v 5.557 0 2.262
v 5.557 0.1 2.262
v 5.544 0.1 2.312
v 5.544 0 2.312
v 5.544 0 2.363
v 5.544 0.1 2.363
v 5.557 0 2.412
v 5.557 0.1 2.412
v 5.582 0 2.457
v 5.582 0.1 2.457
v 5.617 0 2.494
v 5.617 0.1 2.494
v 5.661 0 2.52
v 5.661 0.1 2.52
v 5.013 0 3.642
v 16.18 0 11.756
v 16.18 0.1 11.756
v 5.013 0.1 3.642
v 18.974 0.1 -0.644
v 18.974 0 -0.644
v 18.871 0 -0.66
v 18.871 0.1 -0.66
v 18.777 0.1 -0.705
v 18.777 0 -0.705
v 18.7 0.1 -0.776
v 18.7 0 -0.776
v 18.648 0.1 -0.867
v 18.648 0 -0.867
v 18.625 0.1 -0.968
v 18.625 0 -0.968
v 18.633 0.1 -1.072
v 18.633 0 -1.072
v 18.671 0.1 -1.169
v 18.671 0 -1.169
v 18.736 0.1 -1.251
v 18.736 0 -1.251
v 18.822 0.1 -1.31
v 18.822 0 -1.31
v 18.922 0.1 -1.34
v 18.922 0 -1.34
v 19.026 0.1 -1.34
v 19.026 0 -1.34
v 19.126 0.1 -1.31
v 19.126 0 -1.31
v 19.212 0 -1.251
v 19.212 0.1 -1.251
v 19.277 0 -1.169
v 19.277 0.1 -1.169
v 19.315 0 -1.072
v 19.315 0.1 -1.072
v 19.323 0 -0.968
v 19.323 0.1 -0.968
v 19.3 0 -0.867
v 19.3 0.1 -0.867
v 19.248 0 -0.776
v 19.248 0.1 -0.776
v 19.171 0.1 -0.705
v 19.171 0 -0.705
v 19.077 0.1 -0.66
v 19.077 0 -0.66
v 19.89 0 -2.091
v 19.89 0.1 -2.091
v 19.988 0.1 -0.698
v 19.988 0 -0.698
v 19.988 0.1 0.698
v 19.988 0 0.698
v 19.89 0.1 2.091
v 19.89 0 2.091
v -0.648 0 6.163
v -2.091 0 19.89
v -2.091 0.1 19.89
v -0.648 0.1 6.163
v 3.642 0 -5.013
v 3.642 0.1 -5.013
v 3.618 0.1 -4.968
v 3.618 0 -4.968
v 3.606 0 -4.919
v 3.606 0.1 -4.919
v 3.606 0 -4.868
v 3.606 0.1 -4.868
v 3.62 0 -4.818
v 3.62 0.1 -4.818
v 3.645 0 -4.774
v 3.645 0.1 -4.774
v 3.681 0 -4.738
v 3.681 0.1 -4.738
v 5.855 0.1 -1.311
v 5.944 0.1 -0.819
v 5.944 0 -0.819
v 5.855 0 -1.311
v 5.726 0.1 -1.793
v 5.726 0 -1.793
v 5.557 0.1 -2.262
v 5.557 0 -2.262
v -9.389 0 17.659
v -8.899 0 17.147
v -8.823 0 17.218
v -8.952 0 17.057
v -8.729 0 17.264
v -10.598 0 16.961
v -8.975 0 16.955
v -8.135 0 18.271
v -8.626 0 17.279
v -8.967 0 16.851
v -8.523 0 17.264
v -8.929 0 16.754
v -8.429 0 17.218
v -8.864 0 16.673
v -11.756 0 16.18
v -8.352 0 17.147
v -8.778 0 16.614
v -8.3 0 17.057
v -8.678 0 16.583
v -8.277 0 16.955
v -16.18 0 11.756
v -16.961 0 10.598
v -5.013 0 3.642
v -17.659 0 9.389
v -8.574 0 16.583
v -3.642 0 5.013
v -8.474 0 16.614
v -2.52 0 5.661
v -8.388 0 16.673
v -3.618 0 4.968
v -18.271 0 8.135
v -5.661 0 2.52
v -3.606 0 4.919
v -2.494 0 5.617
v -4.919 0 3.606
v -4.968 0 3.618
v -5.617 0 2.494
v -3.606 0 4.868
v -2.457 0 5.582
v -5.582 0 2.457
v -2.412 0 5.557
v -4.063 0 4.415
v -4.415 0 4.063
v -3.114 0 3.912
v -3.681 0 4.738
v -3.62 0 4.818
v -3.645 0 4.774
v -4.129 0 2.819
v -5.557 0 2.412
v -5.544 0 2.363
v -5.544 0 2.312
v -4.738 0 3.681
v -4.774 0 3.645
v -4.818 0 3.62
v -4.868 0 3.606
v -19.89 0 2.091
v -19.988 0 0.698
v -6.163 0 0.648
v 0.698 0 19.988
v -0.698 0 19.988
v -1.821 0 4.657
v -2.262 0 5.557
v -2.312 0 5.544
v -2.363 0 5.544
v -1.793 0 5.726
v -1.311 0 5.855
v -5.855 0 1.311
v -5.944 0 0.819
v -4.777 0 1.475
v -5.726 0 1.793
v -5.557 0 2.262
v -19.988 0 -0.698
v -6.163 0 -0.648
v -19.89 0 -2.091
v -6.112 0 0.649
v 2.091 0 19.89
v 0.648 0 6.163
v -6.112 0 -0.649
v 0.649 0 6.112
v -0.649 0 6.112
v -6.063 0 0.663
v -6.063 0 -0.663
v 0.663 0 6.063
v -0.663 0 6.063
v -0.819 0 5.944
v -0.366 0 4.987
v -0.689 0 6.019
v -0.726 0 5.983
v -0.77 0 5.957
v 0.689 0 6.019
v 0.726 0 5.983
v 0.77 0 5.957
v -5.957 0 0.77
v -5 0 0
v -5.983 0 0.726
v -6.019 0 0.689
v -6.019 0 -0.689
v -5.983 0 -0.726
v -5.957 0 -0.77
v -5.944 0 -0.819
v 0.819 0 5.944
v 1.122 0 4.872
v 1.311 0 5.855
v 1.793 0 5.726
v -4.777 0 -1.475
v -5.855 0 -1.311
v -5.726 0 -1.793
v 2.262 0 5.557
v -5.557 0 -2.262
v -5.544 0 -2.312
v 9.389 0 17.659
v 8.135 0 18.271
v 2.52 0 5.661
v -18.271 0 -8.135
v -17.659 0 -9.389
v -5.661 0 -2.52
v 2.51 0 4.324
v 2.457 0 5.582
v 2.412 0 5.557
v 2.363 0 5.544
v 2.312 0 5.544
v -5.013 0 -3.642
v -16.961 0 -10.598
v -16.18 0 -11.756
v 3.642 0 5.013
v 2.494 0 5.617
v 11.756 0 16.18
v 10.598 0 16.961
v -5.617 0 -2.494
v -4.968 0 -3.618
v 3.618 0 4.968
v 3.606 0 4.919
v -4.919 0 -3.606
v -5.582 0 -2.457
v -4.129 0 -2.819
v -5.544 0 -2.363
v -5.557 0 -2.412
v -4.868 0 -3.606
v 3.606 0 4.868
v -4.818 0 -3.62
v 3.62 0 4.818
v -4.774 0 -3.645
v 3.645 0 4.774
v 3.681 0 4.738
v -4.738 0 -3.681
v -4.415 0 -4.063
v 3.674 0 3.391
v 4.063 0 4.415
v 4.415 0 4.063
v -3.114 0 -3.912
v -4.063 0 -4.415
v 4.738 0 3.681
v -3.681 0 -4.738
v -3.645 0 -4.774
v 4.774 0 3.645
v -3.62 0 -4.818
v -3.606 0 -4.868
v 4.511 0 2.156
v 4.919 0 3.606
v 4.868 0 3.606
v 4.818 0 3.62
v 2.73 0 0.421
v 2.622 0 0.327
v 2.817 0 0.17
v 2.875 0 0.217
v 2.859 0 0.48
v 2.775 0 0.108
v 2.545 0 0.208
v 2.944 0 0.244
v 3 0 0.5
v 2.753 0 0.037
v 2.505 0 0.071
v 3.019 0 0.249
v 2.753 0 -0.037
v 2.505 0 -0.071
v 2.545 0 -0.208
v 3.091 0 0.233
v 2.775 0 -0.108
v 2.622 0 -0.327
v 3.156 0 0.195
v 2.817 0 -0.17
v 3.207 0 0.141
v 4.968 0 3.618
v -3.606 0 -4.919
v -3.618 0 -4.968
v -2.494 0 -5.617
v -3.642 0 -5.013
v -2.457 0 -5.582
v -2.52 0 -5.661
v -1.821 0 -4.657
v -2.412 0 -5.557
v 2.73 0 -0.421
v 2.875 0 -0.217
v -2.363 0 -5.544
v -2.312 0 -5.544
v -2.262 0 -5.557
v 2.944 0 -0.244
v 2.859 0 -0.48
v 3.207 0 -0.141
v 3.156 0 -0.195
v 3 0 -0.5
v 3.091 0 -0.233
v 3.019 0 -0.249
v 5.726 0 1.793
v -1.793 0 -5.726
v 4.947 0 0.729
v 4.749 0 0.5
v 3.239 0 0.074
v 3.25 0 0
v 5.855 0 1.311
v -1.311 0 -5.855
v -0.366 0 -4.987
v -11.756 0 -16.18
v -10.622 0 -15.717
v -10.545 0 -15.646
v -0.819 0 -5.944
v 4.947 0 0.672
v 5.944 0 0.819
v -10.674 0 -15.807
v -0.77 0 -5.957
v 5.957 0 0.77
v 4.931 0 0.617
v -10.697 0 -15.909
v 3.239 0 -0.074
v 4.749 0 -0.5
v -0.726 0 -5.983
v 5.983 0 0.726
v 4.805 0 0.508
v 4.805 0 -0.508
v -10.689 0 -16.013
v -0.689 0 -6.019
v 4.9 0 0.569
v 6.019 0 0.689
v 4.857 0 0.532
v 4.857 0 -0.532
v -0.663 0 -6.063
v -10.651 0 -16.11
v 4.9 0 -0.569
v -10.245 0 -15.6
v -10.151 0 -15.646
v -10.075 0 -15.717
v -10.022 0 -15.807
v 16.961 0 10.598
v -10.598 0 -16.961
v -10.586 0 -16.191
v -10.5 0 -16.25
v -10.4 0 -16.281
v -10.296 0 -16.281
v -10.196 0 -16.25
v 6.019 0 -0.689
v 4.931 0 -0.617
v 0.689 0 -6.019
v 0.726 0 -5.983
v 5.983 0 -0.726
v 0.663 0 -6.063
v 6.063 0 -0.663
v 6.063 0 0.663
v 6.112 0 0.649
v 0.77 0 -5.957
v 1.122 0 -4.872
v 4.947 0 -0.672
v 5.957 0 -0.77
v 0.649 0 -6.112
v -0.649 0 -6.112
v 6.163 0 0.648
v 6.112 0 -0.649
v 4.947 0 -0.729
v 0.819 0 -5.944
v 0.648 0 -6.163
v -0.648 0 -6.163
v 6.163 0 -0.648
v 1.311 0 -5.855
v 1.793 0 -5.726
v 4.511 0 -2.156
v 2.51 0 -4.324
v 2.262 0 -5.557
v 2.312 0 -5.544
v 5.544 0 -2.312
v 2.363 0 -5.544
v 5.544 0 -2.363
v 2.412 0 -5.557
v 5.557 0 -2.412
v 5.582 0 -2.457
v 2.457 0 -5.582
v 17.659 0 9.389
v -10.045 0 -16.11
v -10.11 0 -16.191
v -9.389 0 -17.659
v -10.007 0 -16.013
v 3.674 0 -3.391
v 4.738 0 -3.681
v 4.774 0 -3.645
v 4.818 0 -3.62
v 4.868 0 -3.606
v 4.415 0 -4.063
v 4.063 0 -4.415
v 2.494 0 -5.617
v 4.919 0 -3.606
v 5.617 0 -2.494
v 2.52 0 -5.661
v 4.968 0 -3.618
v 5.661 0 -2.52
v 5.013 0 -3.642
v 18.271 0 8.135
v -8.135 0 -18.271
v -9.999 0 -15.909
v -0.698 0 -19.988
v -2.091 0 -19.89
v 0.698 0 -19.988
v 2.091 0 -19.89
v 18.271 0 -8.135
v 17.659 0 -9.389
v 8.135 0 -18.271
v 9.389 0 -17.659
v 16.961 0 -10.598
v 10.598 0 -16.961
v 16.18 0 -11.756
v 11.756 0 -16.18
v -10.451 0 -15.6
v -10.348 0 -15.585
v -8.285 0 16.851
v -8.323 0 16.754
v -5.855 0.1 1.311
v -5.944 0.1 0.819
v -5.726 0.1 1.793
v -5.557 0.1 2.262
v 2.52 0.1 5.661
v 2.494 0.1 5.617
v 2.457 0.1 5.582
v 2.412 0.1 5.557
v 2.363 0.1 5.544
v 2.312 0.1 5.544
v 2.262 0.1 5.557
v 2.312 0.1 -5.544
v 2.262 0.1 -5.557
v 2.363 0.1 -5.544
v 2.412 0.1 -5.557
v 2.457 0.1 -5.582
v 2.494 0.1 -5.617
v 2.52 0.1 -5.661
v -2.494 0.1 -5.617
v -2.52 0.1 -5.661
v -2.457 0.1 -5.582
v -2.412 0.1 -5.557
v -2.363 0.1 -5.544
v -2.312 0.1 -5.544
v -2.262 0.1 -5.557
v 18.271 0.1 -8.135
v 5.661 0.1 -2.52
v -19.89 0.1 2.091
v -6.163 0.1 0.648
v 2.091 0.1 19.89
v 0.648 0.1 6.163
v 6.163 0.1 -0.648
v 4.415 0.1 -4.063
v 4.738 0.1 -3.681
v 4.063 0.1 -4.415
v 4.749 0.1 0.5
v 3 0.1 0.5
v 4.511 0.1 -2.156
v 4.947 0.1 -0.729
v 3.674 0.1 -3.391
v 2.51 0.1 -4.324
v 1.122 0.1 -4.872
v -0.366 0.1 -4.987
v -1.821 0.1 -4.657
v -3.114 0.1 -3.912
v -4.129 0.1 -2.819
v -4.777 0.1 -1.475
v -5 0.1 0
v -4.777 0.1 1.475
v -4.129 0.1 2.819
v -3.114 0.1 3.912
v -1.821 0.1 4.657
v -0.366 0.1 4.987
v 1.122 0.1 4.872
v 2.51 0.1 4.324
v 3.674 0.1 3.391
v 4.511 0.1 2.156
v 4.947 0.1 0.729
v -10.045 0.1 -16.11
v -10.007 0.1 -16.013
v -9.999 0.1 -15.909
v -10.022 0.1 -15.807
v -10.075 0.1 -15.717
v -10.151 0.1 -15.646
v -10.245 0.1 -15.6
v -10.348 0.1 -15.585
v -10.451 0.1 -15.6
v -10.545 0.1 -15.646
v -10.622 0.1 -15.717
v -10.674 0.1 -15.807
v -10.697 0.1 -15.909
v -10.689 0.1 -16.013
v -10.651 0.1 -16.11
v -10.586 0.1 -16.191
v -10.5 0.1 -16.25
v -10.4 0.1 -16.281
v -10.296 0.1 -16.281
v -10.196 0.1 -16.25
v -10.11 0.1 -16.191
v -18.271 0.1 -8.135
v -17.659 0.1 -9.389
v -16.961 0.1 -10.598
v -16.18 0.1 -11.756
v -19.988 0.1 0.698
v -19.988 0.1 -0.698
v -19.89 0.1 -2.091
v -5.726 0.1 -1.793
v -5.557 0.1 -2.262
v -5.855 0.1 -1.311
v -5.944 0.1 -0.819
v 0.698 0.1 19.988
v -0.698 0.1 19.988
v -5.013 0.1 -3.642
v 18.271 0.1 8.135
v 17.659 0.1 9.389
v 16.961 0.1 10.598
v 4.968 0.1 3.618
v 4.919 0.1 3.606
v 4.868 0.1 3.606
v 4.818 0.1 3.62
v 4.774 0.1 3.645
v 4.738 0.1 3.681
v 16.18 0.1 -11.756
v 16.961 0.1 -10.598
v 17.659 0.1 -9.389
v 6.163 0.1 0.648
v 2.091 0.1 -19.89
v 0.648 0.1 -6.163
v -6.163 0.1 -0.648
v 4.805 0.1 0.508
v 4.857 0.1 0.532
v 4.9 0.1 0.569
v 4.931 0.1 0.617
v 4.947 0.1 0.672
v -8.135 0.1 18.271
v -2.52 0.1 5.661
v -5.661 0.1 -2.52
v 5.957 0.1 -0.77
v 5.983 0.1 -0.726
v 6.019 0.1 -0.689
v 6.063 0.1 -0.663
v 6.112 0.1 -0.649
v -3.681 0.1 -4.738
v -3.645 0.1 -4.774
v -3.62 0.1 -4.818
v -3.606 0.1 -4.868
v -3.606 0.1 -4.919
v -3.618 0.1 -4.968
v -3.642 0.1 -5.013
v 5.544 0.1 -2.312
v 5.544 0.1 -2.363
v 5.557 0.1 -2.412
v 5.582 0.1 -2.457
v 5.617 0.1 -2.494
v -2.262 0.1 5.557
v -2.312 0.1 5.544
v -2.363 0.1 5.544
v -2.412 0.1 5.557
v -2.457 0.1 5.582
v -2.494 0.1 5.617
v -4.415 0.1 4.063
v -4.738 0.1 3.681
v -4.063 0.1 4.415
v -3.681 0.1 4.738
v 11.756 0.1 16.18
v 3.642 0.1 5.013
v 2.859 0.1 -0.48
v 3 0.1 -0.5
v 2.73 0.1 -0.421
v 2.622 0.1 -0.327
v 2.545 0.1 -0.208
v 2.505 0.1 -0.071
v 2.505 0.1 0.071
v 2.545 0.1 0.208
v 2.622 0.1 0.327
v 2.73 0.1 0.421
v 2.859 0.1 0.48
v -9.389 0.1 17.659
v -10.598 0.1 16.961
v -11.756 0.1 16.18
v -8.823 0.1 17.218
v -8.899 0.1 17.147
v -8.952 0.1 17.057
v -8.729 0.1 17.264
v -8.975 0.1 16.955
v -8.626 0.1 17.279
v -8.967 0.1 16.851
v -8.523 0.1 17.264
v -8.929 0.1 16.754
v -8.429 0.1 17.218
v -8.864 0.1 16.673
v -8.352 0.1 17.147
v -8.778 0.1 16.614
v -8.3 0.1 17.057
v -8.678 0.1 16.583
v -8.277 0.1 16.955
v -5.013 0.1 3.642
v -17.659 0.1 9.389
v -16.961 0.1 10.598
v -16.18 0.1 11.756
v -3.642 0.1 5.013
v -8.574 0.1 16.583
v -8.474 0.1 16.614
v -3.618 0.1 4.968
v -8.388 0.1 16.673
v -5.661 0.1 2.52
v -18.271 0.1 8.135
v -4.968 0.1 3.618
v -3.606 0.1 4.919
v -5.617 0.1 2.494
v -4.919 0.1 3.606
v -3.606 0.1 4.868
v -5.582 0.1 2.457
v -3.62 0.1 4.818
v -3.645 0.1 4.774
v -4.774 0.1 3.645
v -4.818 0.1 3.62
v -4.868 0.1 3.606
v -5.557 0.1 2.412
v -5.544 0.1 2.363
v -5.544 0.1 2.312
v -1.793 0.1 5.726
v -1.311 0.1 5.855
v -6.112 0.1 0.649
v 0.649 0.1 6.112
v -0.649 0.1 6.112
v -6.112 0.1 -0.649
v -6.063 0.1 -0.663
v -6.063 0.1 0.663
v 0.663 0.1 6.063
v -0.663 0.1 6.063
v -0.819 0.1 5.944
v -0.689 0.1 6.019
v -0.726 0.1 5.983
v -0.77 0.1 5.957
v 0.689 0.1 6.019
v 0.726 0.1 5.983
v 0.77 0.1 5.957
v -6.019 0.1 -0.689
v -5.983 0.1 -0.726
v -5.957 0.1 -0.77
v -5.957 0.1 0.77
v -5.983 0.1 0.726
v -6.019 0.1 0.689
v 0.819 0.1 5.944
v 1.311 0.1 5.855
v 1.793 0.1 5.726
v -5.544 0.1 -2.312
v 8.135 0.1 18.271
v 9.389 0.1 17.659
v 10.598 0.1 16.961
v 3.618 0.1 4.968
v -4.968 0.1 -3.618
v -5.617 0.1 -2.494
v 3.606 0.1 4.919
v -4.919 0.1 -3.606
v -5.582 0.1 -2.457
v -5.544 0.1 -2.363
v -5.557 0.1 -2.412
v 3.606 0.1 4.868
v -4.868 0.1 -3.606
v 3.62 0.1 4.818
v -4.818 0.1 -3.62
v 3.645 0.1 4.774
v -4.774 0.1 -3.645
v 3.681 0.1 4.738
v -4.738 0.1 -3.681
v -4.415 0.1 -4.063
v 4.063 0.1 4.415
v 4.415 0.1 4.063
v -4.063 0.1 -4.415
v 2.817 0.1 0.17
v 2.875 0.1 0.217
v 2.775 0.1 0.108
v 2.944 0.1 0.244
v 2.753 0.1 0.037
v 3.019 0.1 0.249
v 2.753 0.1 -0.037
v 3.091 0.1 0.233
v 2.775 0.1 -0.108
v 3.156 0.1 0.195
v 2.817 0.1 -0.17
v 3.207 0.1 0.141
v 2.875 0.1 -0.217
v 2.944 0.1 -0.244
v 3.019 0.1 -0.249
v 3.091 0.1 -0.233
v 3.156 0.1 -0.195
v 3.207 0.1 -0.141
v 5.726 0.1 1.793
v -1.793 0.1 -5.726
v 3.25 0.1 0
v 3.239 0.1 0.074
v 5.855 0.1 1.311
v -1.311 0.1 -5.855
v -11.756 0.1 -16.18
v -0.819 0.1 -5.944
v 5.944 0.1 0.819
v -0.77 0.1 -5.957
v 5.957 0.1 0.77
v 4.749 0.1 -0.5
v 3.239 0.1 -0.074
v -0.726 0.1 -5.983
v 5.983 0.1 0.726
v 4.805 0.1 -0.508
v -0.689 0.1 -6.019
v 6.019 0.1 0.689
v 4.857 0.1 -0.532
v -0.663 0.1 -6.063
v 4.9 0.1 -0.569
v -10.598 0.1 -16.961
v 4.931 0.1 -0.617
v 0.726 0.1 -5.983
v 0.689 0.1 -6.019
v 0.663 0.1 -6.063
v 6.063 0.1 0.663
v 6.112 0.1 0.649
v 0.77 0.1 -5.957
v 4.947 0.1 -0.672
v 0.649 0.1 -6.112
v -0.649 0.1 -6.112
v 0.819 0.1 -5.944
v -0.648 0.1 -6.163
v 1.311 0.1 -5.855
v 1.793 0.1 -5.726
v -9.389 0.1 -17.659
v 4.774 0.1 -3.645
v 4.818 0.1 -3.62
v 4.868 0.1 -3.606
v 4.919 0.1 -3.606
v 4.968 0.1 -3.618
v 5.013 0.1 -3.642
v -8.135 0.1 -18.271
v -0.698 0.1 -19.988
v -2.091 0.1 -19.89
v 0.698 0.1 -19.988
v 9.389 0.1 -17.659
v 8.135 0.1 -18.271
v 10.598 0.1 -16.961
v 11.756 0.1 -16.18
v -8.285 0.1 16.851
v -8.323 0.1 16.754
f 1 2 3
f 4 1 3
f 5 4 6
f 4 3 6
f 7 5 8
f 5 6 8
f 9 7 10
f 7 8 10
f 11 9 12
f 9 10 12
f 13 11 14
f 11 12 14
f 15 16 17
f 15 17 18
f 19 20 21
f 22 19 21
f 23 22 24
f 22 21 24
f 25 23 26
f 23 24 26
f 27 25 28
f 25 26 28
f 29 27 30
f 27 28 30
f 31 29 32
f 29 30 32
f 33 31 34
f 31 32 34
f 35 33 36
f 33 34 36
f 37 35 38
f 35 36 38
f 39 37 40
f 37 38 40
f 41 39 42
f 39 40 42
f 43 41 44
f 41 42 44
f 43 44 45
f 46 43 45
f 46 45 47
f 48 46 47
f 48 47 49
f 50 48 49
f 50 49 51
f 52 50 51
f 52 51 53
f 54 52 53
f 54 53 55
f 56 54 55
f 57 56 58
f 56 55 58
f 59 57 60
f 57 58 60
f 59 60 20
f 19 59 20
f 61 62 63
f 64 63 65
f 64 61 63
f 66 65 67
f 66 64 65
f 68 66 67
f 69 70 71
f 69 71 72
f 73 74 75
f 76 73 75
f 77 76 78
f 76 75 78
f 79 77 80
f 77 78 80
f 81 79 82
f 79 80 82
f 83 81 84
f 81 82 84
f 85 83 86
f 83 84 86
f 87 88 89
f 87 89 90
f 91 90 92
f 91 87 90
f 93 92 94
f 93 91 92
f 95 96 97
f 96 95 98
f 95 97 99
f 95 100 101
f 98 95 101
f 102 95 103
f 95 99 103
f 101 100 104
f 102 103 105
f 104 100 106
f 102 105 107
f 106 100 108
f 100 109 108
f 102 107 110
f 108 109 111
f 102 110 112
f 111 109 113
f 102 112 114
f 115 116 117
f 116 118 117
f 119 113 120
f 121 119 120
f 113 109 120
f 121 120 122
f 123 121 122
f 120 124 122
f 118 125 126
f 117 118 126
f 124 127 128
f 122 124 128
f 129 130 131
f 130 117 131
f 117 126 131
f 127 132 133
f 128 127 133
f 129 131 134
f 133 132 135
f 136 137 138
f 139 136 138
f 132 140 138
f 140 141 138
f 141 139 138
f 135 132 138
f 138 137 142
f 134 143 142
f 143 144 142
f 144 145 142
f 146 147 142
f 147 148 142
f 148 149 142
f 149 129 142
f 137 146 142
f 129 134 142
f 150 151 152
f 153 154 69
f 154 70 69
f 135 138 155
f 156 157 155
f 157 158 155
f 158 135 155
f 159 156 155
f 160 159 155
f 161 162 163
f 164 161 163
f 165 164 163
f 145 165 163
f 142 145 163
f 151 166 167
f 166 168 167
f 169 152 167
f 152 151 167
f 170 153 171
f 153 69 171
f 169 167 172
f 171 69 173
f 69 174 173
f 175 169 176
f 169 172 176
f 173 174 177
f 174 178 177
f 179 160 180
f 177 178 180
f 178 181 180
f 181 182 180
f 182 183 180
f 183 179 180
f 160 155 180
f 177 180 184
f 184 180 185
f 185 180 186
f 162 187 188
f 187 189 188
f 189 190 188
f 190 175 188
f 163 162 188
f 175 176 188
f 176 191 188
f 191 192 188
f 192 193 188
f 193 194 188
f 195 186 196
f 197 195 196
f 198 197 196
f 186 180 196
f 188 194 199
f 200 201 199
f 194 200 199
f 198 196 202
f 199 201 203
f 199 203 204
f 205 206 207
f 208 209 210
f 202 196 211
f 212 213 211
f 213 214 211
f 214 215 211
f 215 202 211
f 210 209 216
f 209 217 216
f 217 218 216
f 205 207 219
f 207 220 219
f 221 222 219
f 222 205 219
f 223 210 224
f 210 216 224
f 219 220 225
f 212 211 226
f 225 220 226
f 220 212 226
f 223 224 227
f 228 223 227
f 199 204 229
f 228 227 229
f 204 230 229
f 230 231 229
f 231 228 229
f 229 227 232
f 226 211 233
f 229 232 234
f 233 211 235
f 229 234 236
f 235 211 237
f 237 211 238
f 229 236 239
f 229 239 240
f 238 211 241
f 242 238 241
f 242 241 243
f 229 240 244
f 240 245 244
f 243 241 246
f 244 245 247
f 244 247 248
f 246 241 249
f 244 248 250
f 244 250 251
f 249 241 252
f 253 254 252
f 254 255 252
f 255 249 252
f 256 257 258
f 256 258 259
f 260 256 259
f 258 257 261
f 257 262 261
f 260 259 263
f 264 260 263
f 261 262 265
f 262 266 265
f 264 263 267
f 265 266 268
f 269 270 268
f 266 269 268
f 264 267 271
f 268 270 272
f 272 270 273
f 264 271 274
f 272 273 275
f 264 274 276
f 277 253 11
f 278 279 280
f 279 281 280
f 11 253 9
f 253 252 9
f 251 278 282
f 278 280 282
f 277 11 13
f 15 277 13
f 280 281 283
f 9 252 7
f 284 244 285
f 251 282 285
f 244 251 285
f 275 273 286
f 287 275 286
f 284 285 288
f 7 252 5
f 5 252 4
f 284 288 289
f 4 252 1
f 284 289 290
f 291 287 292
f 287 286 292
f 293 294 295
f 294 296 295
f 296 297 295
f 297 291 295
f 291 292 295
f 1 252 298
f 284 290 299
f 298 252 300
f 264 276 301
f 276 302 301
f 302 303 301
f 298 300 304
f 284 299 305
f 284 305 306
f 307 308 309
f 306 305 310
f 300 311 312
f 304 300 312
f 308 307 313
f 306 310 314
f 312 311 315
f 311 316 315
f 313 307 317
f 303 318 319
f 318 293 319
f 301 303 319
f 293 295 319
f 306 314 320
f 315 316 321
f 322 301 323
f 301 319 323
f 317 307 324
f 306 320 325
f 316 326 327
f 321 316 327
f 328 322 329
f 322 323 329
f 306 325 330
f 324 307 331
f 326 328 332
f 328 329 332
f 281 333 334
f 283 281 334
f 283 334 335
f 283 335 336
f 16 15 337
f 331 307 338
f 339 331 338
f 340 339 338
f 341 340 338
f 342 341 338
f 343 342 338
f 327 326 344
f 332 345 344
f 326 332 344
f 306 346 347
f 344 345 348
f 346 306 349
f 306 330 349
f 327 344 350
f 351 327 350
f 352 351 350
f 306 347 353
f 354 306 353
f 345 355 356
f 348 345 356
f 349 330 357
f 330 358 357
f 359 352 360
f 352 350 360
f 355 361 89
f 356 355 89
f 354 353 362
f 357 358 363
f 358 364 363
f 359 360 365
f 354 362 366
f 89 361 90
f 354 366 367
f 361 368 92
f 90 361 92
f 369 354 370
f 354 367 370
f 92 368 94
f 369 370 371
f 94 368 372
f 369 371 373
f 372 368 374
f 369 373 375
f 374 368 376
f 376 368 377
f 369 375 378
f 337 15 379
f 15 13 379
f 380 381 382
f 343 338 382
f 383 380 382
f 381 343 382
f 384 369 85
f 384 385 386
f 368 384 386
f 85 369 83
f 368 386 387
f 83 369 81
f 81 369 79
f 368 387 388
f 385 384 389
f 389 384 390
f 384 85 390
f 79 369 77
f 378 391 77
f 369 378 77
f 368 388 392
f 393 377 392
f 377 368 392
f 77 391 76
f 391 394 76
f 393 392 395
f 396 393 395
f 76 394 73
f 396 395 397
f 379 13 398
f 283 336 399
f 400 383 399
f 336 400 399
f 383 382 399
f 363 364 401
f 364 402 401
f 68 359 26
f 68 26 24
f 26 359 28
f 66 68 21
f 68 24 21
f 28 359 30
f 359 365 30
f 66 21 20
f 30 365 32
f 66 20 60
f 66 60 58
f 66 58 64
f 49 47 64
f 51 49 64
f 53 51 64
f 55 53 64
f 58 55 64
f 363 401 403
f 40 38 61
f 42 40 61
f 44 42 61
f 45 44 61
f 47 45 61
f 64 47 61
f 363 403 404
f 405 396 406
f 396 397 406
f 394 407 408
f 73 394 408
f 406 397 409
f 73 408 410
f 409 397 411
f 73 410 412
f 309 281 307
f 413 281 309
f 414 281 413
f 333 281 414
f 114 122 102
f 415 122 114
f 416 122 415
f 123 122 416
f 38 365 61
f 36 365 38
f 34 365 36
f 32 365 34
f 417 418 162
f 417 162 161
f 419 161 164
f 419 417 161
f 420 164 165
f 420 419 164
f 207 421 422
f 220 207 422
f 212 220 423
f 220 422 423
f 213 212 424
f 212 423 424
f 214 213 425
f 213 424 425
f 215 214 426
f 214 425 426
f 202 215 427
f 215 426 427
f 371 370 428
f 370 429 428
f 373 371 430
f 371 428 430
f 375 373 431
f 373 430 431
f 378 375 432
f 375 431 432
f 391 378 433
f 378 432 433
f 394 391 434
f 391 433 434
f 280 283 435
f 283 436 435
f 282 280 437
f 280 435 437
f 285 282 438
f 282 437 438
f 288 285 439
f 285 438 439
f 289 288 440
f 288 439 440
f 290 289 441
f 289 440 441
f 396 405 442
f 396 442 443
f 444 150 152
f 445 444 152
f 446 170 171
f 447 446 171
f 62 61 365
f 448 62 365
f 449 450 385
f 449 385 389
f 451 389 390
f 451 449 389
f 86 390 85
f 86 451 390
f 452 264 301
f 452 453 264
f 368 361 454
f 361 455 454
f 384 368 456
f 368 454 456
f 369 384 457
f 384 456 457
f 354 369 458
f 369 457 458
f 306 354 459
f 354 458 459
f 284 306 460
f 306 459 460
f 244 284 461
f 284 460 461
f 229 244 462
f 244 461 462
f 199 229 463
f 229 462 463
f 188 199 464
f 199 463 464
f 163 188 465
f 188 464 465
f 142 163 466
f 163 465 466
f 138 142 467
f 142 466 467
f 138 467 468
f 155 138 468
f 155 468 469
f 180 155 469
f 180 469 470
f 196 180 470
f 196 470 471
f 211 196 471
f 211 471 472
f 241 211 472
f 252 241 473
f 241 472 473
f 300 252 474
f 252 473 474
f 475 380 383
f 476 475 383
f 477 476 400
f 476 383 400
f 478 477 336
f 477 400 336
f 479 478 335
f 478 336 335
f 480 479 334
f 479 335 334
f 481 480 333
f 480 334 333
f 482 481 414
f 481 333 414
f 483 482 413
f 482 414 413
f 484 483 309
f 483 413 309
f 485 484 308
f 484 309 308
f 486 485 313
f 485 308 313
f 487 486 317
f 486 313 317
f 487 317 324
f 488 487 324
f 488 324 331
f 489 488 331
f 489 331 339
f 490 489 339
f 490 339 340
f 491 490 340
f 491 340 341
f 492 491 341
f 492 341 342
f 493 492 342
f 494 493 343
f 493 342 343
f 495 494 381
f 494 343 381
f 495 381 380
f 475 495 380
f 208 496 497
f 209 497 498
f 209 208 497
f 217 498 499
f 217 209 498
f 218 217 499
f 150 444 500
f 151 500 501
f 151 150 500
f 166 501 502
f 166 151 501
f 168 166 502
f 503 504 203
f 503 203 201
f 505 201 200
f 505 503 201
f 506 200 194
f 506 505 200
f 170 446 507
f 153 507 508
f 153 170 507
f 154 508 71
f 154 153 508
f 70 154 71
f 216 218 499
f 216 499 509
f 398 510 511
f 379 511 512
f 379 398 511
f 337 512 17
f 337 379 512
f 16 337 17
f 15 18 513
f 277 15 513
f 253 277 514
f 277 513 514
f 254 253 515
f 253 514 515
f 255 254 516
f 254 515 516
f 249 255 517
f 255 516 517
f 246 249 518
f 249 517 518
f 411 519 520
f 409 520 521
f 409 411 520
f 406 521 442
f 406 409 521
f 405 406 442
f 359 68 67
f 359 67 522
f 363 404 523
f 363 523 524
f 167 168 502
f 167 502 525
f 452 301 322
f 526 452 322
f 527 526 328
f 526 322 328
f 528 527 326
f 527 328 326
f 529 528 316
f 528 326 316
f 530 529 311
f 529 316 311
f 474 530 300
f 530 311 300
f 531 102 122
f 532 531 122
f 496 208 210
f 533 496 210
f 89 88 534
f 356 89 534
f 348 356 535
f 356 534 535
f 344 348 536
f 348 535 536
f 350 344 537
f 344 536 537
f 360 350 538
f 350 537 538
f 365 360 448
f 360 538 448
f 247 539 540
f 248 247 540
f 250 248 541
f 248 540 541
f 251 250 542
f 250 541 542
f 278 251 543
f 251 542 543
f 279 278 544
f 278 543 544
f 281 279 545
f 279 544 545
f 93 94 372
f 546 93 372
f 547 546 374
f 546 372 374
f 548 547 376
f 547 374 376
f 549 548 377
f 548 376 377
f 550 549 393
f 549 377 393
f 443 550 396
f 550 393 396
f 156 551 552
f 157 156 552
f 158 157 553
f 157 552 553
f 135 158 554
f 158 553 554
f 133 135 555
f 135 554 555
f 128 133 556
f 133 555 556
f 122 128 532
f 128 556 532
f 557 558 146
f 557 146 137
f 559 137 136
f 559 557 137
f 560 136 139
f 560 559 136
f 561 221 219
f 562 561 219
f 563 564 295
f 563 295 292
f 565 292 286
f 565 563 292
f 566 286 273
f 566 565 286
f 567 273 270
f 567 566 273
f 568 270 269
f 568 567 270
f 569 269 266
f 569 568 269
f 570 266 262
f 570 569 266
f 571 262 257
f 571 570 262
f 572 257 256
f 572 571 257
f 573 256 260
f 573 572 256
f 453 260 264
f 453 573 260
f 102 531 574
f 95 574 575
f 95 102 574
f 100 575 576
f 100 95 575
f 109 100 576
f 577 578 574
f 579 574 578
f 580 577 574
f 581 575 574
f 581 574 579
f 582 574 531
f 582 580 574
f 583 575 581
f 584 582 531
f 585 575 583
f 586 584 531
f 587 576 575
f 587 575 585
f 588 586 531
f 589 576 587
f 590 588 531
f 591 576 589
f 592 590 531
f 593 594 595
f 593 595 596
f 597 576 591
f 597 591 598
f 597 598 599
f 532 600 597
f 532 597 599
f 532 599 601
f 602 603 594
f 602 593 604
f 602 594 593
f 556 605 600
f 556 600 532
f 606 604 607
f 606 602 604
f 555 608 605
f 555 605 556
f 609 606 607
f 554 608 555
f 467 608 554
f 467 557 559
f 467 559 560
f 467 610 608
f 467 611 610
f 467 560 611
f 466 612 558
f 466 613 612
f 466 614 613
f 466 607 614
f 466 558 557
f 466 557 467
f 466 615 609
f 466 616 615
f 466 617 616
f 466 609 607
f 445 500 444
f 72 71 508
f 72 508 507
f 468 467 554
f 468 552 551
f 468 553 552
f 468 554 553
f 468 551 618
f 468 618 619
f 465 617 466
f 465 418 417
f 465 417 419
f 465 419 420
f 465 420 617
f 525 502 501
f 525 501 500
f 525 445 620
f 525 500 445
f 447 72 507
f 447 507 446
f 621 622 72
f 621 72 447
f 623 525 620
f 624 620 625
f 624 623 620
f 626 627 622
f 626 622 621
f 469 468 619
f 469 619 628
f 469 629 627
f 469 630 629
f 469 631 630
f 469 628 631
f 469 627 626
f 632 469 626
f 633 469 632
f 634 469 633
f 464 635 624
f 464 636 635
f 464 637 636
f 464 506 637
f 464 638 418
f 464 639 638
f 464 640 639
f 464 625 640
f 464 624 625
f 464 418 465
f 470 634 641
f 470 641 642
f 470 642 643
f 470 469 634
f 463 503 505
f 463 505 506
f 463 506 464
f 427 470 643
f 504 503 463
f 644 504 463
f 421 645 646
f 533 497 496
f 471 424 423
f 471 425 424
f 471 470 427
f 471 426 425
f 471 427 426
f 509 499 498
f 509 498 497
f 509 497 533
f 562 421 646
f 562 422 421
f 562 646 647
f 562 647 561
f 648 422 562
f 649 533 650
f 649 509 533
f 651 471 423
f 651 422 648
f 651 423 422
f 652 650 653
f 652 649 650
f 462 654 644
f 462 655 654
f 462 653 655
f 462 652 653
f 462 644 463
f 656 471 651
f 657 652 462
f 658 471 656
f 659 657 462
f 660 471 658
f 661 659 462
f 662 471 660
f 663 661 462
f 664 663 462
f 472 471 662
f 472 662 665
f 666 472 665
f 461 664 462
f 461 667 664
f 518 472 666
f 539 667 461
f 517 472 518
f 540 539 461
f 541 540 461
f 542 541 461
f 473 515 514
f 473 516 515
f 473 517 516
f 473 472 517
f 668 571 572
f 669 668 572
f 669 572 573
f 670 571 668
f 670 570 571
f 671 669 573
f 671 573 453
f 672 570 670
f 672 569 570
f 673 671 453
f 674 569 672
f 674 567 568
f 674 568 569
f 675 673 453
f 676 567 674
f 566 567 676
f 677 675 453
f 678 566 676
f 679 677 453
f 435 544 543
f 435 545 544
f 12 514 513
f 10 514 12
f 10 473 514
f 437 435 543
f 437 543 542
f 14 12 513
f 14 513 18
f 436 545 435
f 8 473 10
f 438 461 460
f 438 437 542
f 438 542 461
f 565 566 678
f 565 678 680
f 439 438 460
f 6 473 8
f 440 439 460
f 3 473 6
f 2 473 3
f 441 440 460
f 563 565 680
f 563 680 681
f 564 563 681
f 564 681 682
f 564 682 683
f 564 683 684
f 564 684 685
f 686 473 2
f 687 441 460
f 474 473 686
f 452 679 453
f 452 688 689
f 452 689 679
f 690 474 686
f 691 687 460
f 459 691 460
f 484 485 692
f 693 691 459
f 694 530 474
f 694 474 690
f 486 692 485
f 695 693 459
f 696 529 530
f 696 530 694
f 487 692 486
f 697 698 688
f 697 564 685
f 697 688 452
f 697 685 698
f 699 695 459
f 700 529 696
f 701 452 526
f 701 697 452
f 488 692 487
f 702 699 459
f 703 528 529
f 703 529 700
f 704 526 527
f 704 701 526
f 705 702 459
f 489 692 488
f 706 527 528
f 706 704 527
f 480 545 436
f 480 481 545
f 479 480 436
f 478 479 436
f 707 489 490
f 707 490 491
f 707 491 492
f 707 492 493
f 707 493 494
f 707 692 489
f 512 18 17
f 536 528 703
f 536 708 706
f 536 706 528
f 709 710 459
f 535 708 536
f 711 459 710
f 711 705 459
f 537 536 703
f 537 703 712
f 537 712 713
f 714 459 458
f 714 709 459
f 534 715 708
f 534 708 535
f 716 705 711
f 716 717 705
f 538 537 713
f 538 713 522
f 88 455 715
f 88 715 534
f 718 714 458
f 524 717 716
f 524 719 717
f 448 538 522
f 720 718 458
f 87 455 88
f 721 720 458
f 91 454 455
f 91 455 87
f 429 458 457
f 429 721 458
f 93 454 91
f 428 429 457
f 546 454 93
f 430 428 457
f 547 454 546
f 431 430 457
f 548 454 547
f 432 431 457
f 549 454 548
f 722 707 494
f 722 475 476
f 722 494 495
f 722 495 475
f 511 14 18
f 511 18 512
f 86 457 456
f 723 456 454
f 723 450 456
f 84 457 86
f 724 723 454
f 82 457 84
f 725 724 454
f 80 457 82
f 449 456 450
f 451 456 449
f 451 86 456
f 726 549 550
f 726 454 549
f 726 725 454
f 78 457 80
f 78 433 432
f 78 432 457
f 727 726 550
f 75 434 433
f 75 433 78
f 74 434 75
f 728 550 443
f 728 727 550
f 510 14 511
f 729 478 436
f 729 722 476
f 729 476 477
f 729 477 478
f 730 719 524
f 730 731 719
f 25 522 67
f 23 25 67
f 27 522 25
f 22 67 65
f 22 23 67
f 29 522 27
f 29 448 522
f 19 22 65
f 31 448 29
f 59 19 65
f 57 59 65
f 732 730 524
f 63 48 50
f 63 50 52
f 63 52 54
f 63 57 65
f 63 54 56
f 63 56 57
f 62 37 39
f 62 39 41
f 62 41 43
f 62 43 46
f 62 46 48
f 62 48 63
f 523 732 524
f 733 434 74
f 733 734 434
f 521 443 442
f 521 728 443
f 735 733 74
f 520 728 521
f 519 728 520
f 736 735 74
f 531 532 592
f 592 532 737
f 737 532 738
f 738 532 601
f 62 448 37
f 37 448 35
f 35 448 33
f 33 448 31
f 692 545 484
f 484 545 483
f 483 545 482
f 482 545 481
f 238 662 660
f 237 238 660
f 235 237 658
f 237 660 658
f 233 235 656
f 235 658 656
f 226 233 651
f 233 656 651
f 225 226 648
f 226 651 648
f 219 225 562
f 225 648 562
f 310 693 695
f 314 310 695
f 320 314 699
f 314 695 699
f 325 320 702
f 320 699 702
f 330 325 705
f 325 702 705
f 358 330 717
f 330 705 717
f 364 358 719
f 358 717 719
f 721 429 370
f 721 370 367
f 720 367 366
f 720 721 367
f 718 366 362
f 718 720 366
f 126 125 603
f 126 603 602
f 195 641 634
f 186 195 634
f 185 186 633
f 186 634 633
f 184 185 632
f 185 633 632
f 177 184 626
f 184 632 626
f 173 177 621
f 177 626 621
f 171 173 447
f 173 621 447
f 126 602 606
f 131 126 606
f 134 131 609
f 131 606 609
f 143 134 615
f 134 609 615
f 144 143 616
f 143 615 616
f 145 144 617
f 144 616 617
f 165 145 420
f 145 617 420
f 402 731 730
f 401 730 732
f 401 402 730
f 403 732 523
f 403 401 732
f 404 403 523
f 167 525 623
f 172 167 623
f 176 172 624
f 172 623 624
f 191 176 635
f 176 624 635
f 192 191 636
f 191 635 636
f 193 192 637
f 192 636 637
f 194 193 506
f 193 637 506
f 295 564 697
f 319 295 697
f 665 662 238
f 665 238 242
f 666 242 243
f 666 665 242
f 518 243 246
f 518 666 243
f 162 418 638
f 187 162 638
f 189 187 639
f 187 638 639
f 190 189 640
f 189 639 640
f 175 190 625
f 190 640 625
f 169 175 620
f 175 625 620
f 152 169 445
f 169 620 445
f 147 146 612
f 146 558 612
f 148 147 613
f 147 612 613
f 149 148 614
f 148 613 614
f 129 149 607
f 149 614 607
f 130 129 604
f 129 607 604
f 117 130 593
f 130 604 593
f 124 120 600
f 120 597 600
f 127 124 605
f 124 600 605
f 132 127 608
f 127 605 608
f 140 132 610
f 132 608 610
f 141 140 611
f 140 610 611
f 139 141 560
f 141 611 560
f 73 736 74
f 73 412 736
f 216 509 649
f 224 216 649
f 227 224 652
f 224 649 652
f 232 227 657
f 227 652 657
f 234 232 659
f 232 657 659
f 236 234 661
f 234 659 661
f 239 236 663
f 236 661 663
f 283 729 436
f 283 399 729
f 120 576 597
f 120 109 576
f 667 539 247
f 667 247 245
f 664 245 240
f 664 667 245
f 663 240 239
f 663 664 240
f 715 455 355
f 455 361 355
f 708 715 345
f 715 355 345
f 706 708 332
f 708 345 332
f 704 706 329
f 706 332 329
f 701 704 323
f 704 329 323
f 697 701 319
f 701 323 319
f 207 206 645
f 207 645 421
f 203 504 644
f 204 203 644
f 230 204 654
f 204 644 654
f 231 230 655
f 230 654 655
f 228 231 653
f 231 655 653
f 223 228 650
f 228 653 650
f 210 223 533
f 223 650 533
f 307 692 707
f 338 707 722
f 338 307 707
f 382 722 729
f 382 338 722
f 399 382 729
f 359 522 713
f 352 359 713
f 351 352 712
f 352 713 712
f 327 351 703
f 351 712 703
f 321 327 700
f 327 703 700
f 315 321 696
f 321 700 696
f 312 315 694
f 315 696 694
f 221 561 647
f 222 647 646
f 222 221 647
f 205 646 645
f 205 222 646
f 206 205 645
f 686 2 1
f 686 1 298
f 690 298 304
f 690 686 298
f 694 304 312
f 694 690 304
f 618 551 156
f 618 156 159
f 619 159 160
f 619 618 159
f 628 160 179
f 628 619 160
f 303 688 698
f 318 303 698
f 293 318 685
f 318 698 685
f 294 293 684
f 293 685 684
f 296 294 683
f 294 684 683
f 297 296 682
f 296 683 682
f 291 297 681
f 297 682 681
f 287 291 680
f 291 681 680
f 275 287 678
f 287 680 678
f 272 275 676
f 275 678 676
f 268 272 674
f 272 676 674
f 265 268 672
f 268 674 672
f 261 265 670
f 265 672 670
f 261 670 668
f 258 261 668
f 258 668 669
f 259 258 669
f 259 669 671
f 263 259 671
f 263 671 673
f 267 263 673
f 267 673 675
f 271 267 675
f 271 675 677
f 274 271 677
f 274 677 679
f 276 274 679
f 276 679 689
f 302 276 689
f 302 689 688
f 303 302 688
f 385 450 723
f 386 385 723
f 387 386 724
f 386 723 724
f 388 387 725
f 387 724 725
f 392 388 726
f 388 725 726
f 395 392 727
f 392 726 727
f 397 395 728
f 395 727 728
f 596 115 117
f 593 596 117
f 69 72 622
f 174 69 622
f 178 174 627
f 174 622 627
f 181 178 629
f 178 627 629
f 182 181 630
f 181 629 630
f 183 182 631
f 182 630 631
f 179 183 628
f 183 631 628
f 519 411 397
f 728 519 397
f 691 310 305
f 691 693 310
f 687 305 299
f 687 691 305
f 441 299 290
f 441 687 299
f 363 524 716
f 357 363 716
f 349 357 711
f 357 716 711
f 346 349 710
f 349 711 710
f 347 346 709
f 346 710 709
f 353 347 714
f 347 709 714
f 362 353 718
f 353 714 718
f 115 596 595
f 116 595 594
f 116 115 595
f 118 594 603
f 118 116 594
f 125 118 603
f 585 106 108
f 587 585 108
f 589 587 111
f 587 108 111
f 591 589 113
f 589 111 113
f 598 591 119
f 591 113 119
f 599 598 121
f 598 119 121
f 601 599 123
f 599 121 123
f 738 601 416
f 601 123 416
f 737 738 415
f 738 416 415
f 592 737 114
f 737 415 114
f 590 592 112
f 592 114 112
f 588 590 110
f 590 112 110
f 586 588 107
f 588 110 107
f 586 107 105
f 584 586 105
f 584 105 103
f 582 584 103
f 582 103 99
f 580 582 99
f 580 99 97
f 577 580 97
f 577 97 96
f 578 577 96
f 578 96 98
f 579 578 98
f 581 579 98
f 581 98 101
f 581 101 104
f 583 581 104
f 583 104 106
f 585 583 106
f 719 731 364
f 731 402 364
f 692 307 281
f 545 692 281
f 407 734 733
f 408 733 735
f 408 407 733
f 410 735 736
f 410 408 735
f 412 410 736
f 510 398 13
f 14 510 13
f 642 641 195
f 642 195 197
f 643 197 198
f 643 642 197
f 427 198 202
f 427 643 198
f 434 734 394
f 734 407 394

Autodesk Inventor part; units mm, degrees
ref_plane "YZ Plane" through (0, 0, 0) normal (1, 0, 0) x (0, 1, 0)
ref_plane "XZ Plane" through (0, 0, 0) normal (0, 1, 0) x (-1, 0, 0)
ref_plane "XY Plane" through (0, 0, 0) normal (0, 0, 1) x (1, 0, 0)
sketch "Sketch4" plane through (0, 0, 0) normal (0, 1, 0) x (-1, 0, 0)
  circle A0 centre (0, 0) radius 6 construction
  circle A1 centre (0, 0) radius 20 construction
  line L0 (0, 0) -> (-19.8904, -2.0906) construction
  line L1 (0, 0) -> (-19.8904, 2.0906) construction
  line L2 (28, 0) -> (-28, 0) projected
  arc A2 (-19.8904, 2.0906) -> (-19.8904, -2.0906) centre (0, 0) ccw
  line L3 (-19.8904, 2.0906) -> (-5.9671, 0.6272)
  line L4 (-19.8904, -2.0906) -> (-5.9671, -0.6272)
  arc A3 (-5.9671, 0.6272) -> (-5.9671, -0.6272) centre (0, 0) ccw
  dimension "d38" = 12
  dimension "d39" = 40
  dimension "d41" = 6
  dimension "d42" = 6
extrude "Extrusion5" add sketch "Sketch4" along normal blind 0.1
pattern_circular "Circular Pattern1" count 12 over 360 about axis through (0, -10, 0) along (0, 1, 0) of "Extrusion5"
sketch "Sketch5" plane through (0, 0.1, 0) normal (0, 1, 0) x (1, 0, 0)
  arc A0 (5.4813, 2.4404) -> (4.8541, 3.5267) centre (0, 0) ccw projected
  arc A1 (5.9671, -0.6272) -> (5.9671, 0.6272) centre (0, 0) ccw projected
  circle A2 centre (0, 0) radius 6
  circle A3 centre (0, 0) radius 5
  point P0 (4.8541, 3.5267)
  point P1 (5.9671, 0.6272)
  point P2 (5.4813, 2.4404)
  dimension "d48" = 1
extrude "Extrusion6" add sketch "Sketch5" against normal blind 0.1
sketch "Sketch7" plane through (0, 0.1, 0) normal (0, 1, 0) x (1, 0, 0)
  circle A0 centre (0, 0) radius 19 construction
  point P0 (18.974, 0.9944)
  point P1 (19, 0)
  dimension "d55" = 38
  dimension "d56" = 3
hole "Hole1" at (18.974, 0.1, -0.9944) direction (0, -1, 0) diameter 0.7 end through all
pattern_circular "Circular Pattern2" count 3 over 360 about axis through (0, -10, 0) along (0, 1, 0) of "Hole1"
sketch "Sketch8" plane through (0, 0.1, 0) normal (0, 1, 0) x (1, 0, 0)
  circle A0 centre (0, 0) radius 2.5 construction
  circle A1 centre (0, 0) radius 5 projected
  line L0 (5, 0) -> (3, 0)
  line L1 (3, 0) -> (3, 0.5)
  line L2 (3, 0.5) -> (5, 0.5)
  line L3 (5, 0.5) -> (5, 0)
  line L4 (5, 0) -> (3, 0)
  line L5 (3, 0) -> (3, -0.5)
  line L6 (3, -0.5) -> (5, -0.5)
  line L7 (5, -0.5) -> (5, 0)
  circle A2 centre (3, 0) radius 0.5
  circle A3 centre (3, 0) radius 0.25
  point P0 (4.9749, -0.5)
  point P1 (4.9749, 0.5)
  dimension "d67" = 5
  dimension "d68" = 2
  dimension "d69" = 0.5
  dimension "d70" = 0.5
  dimension "d71" = 0.5
extrude "Extrusion8" add sketch "Sketch8" against normal blind 0.1 contours L0 A2 L2 A1 | A1 L6 A2 L0 | A2 L5 A3 L0 | L0 A3 L1 A2 | L1 A3 L5 A2
fillet "Fillet5" radius 0.2 2 edges at (5.9671, 0.05, 0.6272) (5.9671, 0.05, -0.6272)
pattern_circular "Circular Pattern3" count 12 over 360 about axis through (0, 0.1, 0) along (0, -1, 0) of "Fillet5"
fillet "Fillet6" radius 0.2 2 edges at (4.9749, 0.05, -0.5) (4.9749, 0.05, 0.5)
equation "\"d42\" = d41"
properties part number "torsosc-electrode-pcb-cu" material "Copper"
